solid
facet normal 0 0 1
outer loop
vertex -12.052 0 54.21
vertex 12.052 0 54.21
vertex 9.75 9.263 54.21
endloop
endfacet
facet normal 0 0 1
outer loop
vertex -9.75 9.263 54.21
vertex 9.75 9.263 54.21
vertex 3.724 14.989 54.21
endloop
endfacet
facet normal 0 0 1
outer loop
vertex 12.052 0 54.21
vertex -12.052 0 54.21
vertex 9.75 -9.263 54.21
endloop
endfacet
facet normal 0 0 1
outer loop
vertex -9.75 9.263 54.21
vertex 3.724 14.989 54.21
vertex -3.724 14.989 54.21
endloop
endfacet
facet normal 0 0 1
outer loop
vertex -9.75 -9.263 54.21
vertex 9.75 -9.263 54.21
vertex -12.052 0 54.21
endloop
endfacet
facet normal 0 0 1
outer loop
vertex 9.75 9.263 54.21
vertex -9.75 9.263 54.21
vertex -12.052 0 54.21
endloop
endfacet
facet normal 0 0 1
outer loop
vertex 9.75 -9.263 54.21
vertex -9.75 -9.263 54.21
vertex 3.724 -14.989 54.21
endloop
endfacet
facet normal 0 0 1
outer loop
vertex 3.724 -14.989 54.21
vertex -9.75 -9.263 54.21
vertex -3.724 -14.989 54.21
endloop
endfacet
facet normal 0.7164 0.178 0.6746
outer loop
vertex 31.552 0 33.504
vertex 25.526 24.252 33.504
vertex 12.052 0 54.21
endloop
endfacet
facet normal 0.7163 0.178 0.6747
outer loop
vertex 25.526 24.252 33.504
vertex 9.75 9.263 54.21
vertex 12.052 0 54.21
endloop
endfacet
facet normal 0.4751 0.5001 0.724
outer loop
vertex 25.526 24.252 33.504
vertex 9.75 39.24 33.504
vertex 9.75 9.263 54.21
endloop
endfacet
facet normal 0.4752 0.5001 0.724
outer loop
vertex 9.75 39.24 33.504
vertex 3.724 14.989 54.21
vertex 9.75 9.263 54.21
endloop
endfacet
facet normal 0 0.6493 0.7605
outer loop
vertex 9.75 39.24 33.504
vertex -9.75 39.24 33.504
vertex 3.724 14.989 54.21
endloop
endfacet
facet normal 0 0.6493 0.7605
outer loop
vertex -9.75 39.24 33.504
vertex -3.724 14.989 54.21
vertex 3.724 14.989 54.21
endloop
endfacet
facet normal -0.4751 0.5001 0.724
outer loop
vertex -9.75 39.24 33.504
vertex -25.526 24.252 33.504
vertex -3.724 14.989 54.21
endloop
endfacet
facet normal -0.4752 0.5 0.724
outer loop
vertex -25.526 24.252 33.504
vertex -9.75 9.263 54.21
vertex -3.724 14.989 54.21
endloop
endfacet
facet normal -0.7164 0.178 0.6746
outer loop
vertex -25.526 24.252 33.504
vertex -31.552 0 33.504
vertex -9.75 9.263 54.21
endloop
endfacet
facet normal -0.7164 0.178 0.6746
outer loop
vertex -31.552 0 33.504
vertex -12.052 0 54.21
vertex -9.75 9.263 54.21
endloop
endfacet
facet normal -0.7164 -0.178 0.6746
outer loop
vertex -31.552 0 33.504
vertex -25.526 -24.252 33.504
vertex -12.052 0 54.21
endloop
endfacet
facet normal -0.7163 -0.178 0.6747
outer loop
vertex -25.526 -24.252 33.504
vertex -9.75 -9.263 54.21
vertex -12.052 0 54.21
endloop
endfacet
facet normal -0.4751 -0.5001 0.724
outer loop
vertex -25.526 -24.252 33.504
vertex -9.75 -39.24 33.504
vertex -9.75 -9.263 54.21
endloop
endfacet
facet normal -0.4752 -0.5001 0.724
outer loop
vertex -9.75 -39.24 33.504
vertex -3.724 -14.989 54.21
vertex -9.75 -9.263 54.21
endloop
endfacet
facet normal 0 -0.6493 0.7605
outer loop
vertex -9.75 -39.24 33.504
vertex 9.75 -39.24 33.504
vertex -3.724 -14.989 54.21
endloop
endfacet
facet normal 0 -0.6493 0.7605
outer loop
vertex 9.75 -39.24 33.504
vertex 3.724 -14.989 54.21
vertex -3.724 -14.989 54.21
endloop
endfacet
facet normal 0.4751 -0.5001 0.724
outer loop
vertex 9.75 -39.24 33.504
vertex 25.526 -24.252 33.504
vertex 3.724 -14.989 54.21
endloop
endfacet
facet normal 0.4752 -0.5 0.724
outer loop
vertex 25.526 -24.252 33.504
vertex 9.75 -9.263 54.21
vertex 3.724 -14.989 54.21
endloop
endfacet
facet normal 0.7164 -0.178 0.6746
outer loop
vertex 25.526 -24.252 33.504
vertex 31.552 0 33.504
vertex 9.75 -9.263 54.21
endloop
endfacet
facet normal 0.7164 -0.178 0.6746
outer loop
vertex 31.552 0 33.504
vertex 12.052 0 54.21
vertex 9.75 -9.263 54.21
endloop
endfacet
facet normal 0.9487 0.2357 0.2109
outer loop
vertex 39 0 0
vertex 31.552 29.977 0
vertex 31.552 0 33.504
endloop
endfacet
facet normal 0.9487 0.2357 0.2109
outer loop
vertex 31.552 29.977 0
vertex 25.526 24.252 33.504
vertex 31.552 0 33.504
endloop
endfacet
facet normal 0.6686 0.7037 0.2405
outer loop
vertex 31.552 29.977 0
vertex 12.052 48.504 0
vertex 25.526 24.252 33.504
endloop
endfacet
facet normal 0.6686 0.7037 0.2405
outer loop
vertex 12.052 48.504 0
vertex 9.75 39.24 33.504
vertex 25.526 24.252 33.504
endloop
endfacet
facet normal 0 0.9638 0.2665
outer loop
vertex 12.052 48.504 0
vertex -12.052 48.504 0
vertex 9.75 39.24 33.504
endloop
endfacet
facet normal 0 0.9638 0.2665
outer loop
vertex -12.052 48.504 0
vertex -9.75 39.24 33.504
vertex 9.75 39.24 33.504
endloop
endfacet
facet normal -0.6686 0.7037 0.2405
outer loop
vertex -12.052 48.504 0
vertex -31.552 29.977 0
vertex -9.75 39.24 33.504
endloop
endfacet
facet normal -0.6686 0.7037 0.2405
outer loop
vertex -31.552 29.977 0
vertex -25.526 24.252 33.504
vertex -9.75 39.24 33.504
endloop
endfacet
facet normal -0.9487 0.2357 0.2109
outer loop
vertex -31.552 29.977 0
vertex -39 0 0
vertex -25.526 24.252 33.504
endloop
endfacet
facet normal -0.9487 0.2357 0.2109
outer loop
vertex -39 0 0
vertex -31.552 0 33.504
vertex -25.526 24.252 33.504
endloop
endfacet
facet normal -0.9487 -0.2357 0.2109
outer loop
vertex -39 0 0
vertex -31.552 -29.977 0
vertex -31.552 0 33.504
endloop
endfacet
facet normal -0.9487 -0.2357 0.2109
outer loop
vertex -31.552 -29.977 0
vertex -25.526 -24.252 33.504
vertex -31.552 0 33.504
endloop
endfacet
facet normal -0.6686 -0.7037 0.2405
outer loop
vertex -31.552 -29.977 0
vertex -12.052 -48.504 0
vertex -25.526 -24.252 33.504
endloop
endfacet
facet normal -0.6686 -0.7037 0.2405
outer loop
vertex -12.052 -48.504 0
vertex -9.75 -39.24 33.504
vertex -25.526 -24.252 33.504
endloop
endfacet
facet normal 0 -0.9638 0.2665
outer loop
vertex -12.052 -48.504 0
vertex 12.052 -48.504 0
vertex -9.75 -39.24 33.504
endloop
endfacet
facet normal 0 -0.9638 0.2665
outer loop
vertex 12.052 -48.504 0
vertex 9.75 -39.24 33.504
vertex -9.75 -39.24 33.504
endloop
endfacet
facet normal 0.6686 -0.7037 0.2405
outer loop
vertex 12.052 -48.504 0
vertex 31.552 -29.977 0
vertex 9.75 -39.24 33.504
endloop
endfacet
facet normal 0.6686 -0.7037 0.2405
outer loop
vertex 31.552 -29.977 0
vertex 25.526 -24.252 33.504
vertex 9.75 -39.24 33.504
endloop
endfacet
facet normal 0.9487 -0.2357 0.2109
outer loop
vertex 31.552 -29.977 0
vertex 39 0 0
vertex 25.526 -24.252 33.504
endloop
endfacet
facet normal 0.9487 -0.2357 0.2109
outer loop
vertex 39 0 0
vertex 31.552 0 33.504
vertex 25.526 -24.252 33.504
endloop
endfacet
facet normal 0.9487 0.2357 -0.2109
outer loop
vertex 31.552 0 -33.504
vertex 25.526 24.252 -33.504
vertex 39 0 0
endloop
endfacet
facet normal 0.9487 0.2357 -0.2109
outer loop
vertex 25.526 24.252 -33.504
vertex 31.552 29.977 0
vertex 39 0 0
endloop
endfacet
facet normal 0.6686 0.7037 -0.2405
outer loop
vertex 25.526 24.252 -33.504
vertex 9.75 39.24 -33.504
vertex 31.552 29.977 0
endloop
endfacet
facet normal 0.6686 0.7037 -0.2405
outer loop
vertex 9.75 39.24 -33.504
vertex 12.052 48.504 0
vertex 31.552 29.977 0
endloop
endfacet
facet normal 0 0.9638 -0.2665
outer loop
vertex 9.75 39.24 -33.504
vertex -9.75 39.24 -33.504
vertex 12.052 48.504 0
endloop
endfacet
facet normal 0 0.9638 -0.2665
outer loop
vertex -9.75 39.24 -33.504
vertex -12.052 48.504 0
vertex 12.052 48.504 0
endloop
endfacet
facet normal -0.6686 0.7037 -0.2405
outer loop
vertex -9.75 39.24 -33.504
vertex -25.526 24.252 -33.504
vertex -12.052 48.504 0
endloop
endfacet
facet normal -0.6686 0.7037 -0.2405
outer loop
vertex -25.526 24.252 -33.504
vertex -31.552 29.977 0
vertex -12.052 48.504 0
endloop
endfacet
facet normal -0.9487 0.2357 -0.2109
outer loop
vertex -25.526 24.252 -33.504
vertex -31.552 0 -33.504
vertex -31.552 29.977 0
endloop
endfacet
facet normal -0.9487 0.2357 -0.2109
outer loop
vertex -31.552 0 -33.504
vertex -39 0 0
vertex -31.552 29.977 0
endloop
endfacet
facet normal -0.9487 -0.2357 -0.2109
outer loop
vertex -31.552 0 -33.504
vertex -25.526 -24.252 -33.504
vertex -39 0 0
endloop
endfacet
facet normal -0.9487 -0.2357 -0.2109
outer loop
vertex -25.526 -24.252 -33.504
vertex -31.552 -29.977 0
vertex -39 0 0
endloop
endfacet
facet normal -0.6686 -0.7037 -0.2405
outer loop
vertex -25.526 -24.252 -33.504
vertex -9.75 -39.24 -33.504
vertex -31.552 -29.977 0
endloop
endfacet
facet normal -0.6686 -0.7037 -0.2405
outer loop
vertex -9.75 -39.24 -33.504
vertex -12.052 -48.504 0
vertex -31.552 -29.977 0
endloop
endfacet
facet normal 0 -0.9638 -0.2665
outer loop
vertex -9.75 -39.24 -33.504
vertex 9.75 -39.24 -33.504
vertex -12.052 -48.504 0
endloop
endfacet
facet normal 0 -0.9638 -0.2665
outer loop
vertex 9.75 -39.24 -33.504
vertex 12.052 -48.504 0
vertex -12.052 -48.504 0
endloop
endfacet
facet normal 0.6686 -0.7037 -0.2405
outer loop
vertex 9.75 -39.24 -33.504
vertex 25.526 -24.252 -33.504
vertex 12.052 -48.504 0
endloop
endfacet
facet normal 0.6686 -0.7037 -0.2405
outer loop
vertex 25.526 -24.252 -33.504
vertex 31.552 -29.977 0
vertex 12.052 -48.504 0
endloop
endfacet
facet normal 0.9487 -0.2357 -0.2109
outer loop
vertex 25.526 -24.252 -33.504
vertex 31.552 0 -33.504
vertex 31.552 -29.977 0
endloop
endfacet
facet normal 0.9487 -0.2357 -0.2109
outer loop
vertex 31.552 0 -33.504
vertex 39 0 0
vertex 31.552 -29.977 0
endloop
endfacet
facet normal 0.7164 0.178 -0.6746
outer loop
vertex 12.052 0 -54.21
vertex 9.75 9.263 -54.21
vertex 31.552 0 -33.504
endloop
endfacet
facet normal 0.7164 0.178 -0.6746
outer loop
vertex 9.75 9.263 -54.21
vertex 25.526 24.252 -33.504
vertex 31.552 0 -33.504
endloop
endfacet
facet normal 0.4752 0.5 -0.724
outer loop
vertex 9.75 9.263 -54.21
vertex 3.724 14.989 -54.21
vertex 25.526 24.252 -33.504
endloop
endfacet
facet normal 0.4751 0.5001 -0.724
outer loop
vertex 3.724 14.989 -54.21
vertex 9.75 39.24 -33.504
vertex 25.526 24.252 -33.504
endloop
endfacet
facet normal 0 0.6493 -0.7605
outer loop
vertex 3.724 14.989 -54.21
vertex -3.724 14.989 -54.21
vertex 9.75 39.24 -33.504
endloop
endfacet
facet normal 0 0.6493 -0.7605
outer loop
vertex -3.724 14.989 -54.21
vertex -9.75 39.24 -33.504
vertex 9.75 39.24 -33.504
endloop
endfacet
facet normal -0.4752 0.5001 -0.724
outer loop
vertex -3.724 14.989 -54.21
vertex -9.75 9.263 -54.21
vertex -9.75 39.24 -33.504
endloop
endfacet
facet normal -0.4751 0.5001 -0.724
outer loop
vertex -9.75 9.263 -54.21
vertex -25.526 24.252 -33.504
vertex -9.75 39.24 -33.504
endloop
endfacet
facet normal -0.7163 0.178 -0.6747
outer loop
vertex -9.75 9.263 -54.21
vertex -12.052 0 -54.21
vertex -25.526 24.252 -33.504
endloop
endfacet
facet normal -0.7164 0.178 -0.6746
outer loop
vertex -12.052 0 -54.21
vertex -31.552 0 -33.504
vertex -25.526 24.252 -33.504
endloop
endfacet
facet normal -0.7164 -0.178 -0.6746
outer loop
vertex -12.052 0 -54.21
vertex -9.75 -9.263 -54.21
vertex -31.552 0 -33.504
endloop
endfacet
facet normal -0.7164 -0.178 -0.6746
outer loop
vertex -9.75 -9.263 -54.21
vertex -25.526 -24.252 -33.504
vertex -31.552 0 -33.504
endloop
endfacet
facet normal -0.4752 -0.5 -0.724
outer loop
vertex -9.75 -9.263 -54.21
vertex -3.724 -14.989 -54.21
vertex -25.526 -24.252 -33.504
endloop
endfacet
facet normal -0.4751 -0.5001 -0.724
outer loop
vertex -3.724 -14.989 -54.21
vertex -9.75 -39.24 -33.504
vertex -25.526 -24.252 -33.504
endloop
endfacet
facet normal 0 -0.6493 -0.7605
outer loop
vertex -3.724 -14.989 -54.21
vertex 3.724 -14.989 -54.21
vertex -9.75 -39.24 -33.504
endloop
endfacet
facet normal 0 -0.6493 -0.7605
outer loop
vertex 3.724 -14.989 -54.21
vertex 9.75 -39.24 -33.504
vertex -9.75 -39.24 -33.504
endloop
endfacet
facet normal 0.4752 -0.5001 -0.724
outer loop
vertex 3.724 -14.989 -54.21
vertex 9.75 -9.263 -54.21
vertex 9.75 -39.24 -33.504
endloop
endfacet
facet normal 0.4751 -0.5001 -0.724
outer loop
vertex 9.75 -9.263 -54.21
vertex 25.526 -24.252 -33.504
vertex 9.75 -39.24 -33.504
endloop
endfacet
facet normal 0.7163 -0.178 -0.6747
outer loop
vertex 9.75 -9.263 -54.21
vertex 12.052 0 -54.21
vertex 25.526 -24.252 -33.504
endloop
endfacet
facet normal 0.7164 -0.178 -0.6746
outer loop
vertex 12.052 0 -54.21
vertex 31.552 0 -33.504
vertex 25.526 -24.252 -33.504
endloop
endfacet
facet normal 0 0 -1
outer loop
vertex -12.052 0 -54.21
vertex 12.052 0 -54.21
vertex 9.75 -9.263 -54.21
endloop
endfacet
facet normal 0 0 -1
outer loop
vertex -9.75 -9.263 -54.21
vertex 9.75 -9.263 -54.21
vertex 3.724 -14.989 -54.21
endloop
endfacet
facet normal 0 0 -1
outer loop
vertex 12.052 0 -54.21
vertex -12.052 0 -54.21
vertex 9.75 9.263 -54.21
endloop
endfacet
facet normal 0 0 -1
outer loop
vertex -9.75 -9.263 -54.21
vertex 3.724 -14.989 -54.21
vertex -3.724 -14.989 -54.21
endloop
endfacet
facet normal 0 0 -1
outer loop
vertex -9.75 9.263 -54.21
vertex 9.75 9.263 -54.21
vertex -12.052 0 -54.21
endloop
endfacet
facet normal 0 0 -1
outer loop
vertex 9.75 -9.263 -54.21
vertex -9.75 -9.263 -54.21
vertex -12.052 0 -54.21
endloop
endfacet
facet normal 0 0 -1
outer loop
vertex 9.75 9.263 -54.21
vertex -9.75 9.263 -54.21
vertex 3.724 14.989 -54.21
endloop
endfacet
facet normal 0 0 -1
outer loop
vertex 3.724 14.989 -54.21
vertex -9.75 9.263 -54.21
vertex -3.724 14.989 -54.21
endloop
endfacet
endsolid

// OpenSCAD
// Generated by SolidPython 1.0.1 on 2020-07-29 00:46:51


scale(v = [13, 17, 19]) {
	sphere(r = 3);
}
/***********************************************
*********      SolidPython code:      **********
************************************************
 
# import packages: SolidPython
from solid import *
from solid.utils import *
from itertools import chain, combinations, permutations


class Resize:

    def __init__(self, scad_file):
        self.scad_file = scad_file
        #self.scad_file = import_scad(scad_file)
        # cone/cylinder param:
        self.r1 = 0
        self.r2 = 0
        self.h = 0
        # rectangular prism param:
        self.w = 0
        self.l = 0
        # ellipse param:
        self.r = 0

    # import OpenScad code (file name corresponds to shape)


    # classify shape + parameters
    def assign(self, param1, param2, param3):
        if self.scad_file == 'cone.scad':
            self.r1 = param1
            self.r2 = param2
            self.h = param3
        elif self.scad_file == 'cylinder.scad':
            self.r1 = param1
            self.r2 = param2
            self.h = param3
        elif self.scad_file == 'rectangularPrism.scad':
            self.h = param1
            self.l = param2
            self.w = param3
        else:
            self.r = param1
            self.h = param2

    # resize parameters
    def iterate(self):
        x = range(3, 20, 2)
        i = 1
        if self.scad_file == 'cone.scad':
            tempList = list(permutations(x, 2))
            for temp in tempList:
                param1 = temp[0]
                param2 = temp[1]
                filepath = 'produced_scad_files/' + 'cone' + str(param1) + '_' + str(param2) + '_' + '.scad'
                scad_render_to_file(cylinder(h=param1, r1=param2, r2=0), filepath)

        elif self.scad_file == 'cylinder.scad':
            tempList = list(permutations(x, 3))
            for temp in tempList:
                param1 = temp[0]
                param2 = temp[1]
                filepath = 'produced_scad_files/' + 'cylinder' + str(param1) + '_' + str(param2) + '_' + '.scad'
                scad_render_to_file(cylinder(h=param1, r1=param2, r2=param2), filepath)

        elif self.scad_file == 'rectangularPrism.scad':
            tempList = list(permutations(x, 3))
            for temp in tempList:
                param1 = temp[0]
                param2 = temp[1]
                param3 = temp[2]
                filepath = 'produced_scad_files/' + 'rectangularPrism' + str(param1) + '_' + str(param2) + '_' + str(
                    param3) + '.scad'
                scad_render_to_file(cube(size=(param1, param2, param3)), filepath)

        elif self.scad_file == 'ellipse.scad':
            tempList = list(permutations(x, 4))
            for temp in tempList:
                param1 = temp[0]
                param2 = temp[1]
                param3 = temp[2]
                param4 = temp[3]
                filepath = 'produced_scad_files/' + 'ellipse' + str(param1) + '_' + str(param2) + '_' + str(param3) + '_' + str(param4) + '.scad'
                scad_render_to_file(scale([param1, param2, param3])(sphere(r=param4)), filepath)

    def render_to_scadfile(self):
        scad_render_to_file(scad, 'example.scad') 
 
************************************************/
